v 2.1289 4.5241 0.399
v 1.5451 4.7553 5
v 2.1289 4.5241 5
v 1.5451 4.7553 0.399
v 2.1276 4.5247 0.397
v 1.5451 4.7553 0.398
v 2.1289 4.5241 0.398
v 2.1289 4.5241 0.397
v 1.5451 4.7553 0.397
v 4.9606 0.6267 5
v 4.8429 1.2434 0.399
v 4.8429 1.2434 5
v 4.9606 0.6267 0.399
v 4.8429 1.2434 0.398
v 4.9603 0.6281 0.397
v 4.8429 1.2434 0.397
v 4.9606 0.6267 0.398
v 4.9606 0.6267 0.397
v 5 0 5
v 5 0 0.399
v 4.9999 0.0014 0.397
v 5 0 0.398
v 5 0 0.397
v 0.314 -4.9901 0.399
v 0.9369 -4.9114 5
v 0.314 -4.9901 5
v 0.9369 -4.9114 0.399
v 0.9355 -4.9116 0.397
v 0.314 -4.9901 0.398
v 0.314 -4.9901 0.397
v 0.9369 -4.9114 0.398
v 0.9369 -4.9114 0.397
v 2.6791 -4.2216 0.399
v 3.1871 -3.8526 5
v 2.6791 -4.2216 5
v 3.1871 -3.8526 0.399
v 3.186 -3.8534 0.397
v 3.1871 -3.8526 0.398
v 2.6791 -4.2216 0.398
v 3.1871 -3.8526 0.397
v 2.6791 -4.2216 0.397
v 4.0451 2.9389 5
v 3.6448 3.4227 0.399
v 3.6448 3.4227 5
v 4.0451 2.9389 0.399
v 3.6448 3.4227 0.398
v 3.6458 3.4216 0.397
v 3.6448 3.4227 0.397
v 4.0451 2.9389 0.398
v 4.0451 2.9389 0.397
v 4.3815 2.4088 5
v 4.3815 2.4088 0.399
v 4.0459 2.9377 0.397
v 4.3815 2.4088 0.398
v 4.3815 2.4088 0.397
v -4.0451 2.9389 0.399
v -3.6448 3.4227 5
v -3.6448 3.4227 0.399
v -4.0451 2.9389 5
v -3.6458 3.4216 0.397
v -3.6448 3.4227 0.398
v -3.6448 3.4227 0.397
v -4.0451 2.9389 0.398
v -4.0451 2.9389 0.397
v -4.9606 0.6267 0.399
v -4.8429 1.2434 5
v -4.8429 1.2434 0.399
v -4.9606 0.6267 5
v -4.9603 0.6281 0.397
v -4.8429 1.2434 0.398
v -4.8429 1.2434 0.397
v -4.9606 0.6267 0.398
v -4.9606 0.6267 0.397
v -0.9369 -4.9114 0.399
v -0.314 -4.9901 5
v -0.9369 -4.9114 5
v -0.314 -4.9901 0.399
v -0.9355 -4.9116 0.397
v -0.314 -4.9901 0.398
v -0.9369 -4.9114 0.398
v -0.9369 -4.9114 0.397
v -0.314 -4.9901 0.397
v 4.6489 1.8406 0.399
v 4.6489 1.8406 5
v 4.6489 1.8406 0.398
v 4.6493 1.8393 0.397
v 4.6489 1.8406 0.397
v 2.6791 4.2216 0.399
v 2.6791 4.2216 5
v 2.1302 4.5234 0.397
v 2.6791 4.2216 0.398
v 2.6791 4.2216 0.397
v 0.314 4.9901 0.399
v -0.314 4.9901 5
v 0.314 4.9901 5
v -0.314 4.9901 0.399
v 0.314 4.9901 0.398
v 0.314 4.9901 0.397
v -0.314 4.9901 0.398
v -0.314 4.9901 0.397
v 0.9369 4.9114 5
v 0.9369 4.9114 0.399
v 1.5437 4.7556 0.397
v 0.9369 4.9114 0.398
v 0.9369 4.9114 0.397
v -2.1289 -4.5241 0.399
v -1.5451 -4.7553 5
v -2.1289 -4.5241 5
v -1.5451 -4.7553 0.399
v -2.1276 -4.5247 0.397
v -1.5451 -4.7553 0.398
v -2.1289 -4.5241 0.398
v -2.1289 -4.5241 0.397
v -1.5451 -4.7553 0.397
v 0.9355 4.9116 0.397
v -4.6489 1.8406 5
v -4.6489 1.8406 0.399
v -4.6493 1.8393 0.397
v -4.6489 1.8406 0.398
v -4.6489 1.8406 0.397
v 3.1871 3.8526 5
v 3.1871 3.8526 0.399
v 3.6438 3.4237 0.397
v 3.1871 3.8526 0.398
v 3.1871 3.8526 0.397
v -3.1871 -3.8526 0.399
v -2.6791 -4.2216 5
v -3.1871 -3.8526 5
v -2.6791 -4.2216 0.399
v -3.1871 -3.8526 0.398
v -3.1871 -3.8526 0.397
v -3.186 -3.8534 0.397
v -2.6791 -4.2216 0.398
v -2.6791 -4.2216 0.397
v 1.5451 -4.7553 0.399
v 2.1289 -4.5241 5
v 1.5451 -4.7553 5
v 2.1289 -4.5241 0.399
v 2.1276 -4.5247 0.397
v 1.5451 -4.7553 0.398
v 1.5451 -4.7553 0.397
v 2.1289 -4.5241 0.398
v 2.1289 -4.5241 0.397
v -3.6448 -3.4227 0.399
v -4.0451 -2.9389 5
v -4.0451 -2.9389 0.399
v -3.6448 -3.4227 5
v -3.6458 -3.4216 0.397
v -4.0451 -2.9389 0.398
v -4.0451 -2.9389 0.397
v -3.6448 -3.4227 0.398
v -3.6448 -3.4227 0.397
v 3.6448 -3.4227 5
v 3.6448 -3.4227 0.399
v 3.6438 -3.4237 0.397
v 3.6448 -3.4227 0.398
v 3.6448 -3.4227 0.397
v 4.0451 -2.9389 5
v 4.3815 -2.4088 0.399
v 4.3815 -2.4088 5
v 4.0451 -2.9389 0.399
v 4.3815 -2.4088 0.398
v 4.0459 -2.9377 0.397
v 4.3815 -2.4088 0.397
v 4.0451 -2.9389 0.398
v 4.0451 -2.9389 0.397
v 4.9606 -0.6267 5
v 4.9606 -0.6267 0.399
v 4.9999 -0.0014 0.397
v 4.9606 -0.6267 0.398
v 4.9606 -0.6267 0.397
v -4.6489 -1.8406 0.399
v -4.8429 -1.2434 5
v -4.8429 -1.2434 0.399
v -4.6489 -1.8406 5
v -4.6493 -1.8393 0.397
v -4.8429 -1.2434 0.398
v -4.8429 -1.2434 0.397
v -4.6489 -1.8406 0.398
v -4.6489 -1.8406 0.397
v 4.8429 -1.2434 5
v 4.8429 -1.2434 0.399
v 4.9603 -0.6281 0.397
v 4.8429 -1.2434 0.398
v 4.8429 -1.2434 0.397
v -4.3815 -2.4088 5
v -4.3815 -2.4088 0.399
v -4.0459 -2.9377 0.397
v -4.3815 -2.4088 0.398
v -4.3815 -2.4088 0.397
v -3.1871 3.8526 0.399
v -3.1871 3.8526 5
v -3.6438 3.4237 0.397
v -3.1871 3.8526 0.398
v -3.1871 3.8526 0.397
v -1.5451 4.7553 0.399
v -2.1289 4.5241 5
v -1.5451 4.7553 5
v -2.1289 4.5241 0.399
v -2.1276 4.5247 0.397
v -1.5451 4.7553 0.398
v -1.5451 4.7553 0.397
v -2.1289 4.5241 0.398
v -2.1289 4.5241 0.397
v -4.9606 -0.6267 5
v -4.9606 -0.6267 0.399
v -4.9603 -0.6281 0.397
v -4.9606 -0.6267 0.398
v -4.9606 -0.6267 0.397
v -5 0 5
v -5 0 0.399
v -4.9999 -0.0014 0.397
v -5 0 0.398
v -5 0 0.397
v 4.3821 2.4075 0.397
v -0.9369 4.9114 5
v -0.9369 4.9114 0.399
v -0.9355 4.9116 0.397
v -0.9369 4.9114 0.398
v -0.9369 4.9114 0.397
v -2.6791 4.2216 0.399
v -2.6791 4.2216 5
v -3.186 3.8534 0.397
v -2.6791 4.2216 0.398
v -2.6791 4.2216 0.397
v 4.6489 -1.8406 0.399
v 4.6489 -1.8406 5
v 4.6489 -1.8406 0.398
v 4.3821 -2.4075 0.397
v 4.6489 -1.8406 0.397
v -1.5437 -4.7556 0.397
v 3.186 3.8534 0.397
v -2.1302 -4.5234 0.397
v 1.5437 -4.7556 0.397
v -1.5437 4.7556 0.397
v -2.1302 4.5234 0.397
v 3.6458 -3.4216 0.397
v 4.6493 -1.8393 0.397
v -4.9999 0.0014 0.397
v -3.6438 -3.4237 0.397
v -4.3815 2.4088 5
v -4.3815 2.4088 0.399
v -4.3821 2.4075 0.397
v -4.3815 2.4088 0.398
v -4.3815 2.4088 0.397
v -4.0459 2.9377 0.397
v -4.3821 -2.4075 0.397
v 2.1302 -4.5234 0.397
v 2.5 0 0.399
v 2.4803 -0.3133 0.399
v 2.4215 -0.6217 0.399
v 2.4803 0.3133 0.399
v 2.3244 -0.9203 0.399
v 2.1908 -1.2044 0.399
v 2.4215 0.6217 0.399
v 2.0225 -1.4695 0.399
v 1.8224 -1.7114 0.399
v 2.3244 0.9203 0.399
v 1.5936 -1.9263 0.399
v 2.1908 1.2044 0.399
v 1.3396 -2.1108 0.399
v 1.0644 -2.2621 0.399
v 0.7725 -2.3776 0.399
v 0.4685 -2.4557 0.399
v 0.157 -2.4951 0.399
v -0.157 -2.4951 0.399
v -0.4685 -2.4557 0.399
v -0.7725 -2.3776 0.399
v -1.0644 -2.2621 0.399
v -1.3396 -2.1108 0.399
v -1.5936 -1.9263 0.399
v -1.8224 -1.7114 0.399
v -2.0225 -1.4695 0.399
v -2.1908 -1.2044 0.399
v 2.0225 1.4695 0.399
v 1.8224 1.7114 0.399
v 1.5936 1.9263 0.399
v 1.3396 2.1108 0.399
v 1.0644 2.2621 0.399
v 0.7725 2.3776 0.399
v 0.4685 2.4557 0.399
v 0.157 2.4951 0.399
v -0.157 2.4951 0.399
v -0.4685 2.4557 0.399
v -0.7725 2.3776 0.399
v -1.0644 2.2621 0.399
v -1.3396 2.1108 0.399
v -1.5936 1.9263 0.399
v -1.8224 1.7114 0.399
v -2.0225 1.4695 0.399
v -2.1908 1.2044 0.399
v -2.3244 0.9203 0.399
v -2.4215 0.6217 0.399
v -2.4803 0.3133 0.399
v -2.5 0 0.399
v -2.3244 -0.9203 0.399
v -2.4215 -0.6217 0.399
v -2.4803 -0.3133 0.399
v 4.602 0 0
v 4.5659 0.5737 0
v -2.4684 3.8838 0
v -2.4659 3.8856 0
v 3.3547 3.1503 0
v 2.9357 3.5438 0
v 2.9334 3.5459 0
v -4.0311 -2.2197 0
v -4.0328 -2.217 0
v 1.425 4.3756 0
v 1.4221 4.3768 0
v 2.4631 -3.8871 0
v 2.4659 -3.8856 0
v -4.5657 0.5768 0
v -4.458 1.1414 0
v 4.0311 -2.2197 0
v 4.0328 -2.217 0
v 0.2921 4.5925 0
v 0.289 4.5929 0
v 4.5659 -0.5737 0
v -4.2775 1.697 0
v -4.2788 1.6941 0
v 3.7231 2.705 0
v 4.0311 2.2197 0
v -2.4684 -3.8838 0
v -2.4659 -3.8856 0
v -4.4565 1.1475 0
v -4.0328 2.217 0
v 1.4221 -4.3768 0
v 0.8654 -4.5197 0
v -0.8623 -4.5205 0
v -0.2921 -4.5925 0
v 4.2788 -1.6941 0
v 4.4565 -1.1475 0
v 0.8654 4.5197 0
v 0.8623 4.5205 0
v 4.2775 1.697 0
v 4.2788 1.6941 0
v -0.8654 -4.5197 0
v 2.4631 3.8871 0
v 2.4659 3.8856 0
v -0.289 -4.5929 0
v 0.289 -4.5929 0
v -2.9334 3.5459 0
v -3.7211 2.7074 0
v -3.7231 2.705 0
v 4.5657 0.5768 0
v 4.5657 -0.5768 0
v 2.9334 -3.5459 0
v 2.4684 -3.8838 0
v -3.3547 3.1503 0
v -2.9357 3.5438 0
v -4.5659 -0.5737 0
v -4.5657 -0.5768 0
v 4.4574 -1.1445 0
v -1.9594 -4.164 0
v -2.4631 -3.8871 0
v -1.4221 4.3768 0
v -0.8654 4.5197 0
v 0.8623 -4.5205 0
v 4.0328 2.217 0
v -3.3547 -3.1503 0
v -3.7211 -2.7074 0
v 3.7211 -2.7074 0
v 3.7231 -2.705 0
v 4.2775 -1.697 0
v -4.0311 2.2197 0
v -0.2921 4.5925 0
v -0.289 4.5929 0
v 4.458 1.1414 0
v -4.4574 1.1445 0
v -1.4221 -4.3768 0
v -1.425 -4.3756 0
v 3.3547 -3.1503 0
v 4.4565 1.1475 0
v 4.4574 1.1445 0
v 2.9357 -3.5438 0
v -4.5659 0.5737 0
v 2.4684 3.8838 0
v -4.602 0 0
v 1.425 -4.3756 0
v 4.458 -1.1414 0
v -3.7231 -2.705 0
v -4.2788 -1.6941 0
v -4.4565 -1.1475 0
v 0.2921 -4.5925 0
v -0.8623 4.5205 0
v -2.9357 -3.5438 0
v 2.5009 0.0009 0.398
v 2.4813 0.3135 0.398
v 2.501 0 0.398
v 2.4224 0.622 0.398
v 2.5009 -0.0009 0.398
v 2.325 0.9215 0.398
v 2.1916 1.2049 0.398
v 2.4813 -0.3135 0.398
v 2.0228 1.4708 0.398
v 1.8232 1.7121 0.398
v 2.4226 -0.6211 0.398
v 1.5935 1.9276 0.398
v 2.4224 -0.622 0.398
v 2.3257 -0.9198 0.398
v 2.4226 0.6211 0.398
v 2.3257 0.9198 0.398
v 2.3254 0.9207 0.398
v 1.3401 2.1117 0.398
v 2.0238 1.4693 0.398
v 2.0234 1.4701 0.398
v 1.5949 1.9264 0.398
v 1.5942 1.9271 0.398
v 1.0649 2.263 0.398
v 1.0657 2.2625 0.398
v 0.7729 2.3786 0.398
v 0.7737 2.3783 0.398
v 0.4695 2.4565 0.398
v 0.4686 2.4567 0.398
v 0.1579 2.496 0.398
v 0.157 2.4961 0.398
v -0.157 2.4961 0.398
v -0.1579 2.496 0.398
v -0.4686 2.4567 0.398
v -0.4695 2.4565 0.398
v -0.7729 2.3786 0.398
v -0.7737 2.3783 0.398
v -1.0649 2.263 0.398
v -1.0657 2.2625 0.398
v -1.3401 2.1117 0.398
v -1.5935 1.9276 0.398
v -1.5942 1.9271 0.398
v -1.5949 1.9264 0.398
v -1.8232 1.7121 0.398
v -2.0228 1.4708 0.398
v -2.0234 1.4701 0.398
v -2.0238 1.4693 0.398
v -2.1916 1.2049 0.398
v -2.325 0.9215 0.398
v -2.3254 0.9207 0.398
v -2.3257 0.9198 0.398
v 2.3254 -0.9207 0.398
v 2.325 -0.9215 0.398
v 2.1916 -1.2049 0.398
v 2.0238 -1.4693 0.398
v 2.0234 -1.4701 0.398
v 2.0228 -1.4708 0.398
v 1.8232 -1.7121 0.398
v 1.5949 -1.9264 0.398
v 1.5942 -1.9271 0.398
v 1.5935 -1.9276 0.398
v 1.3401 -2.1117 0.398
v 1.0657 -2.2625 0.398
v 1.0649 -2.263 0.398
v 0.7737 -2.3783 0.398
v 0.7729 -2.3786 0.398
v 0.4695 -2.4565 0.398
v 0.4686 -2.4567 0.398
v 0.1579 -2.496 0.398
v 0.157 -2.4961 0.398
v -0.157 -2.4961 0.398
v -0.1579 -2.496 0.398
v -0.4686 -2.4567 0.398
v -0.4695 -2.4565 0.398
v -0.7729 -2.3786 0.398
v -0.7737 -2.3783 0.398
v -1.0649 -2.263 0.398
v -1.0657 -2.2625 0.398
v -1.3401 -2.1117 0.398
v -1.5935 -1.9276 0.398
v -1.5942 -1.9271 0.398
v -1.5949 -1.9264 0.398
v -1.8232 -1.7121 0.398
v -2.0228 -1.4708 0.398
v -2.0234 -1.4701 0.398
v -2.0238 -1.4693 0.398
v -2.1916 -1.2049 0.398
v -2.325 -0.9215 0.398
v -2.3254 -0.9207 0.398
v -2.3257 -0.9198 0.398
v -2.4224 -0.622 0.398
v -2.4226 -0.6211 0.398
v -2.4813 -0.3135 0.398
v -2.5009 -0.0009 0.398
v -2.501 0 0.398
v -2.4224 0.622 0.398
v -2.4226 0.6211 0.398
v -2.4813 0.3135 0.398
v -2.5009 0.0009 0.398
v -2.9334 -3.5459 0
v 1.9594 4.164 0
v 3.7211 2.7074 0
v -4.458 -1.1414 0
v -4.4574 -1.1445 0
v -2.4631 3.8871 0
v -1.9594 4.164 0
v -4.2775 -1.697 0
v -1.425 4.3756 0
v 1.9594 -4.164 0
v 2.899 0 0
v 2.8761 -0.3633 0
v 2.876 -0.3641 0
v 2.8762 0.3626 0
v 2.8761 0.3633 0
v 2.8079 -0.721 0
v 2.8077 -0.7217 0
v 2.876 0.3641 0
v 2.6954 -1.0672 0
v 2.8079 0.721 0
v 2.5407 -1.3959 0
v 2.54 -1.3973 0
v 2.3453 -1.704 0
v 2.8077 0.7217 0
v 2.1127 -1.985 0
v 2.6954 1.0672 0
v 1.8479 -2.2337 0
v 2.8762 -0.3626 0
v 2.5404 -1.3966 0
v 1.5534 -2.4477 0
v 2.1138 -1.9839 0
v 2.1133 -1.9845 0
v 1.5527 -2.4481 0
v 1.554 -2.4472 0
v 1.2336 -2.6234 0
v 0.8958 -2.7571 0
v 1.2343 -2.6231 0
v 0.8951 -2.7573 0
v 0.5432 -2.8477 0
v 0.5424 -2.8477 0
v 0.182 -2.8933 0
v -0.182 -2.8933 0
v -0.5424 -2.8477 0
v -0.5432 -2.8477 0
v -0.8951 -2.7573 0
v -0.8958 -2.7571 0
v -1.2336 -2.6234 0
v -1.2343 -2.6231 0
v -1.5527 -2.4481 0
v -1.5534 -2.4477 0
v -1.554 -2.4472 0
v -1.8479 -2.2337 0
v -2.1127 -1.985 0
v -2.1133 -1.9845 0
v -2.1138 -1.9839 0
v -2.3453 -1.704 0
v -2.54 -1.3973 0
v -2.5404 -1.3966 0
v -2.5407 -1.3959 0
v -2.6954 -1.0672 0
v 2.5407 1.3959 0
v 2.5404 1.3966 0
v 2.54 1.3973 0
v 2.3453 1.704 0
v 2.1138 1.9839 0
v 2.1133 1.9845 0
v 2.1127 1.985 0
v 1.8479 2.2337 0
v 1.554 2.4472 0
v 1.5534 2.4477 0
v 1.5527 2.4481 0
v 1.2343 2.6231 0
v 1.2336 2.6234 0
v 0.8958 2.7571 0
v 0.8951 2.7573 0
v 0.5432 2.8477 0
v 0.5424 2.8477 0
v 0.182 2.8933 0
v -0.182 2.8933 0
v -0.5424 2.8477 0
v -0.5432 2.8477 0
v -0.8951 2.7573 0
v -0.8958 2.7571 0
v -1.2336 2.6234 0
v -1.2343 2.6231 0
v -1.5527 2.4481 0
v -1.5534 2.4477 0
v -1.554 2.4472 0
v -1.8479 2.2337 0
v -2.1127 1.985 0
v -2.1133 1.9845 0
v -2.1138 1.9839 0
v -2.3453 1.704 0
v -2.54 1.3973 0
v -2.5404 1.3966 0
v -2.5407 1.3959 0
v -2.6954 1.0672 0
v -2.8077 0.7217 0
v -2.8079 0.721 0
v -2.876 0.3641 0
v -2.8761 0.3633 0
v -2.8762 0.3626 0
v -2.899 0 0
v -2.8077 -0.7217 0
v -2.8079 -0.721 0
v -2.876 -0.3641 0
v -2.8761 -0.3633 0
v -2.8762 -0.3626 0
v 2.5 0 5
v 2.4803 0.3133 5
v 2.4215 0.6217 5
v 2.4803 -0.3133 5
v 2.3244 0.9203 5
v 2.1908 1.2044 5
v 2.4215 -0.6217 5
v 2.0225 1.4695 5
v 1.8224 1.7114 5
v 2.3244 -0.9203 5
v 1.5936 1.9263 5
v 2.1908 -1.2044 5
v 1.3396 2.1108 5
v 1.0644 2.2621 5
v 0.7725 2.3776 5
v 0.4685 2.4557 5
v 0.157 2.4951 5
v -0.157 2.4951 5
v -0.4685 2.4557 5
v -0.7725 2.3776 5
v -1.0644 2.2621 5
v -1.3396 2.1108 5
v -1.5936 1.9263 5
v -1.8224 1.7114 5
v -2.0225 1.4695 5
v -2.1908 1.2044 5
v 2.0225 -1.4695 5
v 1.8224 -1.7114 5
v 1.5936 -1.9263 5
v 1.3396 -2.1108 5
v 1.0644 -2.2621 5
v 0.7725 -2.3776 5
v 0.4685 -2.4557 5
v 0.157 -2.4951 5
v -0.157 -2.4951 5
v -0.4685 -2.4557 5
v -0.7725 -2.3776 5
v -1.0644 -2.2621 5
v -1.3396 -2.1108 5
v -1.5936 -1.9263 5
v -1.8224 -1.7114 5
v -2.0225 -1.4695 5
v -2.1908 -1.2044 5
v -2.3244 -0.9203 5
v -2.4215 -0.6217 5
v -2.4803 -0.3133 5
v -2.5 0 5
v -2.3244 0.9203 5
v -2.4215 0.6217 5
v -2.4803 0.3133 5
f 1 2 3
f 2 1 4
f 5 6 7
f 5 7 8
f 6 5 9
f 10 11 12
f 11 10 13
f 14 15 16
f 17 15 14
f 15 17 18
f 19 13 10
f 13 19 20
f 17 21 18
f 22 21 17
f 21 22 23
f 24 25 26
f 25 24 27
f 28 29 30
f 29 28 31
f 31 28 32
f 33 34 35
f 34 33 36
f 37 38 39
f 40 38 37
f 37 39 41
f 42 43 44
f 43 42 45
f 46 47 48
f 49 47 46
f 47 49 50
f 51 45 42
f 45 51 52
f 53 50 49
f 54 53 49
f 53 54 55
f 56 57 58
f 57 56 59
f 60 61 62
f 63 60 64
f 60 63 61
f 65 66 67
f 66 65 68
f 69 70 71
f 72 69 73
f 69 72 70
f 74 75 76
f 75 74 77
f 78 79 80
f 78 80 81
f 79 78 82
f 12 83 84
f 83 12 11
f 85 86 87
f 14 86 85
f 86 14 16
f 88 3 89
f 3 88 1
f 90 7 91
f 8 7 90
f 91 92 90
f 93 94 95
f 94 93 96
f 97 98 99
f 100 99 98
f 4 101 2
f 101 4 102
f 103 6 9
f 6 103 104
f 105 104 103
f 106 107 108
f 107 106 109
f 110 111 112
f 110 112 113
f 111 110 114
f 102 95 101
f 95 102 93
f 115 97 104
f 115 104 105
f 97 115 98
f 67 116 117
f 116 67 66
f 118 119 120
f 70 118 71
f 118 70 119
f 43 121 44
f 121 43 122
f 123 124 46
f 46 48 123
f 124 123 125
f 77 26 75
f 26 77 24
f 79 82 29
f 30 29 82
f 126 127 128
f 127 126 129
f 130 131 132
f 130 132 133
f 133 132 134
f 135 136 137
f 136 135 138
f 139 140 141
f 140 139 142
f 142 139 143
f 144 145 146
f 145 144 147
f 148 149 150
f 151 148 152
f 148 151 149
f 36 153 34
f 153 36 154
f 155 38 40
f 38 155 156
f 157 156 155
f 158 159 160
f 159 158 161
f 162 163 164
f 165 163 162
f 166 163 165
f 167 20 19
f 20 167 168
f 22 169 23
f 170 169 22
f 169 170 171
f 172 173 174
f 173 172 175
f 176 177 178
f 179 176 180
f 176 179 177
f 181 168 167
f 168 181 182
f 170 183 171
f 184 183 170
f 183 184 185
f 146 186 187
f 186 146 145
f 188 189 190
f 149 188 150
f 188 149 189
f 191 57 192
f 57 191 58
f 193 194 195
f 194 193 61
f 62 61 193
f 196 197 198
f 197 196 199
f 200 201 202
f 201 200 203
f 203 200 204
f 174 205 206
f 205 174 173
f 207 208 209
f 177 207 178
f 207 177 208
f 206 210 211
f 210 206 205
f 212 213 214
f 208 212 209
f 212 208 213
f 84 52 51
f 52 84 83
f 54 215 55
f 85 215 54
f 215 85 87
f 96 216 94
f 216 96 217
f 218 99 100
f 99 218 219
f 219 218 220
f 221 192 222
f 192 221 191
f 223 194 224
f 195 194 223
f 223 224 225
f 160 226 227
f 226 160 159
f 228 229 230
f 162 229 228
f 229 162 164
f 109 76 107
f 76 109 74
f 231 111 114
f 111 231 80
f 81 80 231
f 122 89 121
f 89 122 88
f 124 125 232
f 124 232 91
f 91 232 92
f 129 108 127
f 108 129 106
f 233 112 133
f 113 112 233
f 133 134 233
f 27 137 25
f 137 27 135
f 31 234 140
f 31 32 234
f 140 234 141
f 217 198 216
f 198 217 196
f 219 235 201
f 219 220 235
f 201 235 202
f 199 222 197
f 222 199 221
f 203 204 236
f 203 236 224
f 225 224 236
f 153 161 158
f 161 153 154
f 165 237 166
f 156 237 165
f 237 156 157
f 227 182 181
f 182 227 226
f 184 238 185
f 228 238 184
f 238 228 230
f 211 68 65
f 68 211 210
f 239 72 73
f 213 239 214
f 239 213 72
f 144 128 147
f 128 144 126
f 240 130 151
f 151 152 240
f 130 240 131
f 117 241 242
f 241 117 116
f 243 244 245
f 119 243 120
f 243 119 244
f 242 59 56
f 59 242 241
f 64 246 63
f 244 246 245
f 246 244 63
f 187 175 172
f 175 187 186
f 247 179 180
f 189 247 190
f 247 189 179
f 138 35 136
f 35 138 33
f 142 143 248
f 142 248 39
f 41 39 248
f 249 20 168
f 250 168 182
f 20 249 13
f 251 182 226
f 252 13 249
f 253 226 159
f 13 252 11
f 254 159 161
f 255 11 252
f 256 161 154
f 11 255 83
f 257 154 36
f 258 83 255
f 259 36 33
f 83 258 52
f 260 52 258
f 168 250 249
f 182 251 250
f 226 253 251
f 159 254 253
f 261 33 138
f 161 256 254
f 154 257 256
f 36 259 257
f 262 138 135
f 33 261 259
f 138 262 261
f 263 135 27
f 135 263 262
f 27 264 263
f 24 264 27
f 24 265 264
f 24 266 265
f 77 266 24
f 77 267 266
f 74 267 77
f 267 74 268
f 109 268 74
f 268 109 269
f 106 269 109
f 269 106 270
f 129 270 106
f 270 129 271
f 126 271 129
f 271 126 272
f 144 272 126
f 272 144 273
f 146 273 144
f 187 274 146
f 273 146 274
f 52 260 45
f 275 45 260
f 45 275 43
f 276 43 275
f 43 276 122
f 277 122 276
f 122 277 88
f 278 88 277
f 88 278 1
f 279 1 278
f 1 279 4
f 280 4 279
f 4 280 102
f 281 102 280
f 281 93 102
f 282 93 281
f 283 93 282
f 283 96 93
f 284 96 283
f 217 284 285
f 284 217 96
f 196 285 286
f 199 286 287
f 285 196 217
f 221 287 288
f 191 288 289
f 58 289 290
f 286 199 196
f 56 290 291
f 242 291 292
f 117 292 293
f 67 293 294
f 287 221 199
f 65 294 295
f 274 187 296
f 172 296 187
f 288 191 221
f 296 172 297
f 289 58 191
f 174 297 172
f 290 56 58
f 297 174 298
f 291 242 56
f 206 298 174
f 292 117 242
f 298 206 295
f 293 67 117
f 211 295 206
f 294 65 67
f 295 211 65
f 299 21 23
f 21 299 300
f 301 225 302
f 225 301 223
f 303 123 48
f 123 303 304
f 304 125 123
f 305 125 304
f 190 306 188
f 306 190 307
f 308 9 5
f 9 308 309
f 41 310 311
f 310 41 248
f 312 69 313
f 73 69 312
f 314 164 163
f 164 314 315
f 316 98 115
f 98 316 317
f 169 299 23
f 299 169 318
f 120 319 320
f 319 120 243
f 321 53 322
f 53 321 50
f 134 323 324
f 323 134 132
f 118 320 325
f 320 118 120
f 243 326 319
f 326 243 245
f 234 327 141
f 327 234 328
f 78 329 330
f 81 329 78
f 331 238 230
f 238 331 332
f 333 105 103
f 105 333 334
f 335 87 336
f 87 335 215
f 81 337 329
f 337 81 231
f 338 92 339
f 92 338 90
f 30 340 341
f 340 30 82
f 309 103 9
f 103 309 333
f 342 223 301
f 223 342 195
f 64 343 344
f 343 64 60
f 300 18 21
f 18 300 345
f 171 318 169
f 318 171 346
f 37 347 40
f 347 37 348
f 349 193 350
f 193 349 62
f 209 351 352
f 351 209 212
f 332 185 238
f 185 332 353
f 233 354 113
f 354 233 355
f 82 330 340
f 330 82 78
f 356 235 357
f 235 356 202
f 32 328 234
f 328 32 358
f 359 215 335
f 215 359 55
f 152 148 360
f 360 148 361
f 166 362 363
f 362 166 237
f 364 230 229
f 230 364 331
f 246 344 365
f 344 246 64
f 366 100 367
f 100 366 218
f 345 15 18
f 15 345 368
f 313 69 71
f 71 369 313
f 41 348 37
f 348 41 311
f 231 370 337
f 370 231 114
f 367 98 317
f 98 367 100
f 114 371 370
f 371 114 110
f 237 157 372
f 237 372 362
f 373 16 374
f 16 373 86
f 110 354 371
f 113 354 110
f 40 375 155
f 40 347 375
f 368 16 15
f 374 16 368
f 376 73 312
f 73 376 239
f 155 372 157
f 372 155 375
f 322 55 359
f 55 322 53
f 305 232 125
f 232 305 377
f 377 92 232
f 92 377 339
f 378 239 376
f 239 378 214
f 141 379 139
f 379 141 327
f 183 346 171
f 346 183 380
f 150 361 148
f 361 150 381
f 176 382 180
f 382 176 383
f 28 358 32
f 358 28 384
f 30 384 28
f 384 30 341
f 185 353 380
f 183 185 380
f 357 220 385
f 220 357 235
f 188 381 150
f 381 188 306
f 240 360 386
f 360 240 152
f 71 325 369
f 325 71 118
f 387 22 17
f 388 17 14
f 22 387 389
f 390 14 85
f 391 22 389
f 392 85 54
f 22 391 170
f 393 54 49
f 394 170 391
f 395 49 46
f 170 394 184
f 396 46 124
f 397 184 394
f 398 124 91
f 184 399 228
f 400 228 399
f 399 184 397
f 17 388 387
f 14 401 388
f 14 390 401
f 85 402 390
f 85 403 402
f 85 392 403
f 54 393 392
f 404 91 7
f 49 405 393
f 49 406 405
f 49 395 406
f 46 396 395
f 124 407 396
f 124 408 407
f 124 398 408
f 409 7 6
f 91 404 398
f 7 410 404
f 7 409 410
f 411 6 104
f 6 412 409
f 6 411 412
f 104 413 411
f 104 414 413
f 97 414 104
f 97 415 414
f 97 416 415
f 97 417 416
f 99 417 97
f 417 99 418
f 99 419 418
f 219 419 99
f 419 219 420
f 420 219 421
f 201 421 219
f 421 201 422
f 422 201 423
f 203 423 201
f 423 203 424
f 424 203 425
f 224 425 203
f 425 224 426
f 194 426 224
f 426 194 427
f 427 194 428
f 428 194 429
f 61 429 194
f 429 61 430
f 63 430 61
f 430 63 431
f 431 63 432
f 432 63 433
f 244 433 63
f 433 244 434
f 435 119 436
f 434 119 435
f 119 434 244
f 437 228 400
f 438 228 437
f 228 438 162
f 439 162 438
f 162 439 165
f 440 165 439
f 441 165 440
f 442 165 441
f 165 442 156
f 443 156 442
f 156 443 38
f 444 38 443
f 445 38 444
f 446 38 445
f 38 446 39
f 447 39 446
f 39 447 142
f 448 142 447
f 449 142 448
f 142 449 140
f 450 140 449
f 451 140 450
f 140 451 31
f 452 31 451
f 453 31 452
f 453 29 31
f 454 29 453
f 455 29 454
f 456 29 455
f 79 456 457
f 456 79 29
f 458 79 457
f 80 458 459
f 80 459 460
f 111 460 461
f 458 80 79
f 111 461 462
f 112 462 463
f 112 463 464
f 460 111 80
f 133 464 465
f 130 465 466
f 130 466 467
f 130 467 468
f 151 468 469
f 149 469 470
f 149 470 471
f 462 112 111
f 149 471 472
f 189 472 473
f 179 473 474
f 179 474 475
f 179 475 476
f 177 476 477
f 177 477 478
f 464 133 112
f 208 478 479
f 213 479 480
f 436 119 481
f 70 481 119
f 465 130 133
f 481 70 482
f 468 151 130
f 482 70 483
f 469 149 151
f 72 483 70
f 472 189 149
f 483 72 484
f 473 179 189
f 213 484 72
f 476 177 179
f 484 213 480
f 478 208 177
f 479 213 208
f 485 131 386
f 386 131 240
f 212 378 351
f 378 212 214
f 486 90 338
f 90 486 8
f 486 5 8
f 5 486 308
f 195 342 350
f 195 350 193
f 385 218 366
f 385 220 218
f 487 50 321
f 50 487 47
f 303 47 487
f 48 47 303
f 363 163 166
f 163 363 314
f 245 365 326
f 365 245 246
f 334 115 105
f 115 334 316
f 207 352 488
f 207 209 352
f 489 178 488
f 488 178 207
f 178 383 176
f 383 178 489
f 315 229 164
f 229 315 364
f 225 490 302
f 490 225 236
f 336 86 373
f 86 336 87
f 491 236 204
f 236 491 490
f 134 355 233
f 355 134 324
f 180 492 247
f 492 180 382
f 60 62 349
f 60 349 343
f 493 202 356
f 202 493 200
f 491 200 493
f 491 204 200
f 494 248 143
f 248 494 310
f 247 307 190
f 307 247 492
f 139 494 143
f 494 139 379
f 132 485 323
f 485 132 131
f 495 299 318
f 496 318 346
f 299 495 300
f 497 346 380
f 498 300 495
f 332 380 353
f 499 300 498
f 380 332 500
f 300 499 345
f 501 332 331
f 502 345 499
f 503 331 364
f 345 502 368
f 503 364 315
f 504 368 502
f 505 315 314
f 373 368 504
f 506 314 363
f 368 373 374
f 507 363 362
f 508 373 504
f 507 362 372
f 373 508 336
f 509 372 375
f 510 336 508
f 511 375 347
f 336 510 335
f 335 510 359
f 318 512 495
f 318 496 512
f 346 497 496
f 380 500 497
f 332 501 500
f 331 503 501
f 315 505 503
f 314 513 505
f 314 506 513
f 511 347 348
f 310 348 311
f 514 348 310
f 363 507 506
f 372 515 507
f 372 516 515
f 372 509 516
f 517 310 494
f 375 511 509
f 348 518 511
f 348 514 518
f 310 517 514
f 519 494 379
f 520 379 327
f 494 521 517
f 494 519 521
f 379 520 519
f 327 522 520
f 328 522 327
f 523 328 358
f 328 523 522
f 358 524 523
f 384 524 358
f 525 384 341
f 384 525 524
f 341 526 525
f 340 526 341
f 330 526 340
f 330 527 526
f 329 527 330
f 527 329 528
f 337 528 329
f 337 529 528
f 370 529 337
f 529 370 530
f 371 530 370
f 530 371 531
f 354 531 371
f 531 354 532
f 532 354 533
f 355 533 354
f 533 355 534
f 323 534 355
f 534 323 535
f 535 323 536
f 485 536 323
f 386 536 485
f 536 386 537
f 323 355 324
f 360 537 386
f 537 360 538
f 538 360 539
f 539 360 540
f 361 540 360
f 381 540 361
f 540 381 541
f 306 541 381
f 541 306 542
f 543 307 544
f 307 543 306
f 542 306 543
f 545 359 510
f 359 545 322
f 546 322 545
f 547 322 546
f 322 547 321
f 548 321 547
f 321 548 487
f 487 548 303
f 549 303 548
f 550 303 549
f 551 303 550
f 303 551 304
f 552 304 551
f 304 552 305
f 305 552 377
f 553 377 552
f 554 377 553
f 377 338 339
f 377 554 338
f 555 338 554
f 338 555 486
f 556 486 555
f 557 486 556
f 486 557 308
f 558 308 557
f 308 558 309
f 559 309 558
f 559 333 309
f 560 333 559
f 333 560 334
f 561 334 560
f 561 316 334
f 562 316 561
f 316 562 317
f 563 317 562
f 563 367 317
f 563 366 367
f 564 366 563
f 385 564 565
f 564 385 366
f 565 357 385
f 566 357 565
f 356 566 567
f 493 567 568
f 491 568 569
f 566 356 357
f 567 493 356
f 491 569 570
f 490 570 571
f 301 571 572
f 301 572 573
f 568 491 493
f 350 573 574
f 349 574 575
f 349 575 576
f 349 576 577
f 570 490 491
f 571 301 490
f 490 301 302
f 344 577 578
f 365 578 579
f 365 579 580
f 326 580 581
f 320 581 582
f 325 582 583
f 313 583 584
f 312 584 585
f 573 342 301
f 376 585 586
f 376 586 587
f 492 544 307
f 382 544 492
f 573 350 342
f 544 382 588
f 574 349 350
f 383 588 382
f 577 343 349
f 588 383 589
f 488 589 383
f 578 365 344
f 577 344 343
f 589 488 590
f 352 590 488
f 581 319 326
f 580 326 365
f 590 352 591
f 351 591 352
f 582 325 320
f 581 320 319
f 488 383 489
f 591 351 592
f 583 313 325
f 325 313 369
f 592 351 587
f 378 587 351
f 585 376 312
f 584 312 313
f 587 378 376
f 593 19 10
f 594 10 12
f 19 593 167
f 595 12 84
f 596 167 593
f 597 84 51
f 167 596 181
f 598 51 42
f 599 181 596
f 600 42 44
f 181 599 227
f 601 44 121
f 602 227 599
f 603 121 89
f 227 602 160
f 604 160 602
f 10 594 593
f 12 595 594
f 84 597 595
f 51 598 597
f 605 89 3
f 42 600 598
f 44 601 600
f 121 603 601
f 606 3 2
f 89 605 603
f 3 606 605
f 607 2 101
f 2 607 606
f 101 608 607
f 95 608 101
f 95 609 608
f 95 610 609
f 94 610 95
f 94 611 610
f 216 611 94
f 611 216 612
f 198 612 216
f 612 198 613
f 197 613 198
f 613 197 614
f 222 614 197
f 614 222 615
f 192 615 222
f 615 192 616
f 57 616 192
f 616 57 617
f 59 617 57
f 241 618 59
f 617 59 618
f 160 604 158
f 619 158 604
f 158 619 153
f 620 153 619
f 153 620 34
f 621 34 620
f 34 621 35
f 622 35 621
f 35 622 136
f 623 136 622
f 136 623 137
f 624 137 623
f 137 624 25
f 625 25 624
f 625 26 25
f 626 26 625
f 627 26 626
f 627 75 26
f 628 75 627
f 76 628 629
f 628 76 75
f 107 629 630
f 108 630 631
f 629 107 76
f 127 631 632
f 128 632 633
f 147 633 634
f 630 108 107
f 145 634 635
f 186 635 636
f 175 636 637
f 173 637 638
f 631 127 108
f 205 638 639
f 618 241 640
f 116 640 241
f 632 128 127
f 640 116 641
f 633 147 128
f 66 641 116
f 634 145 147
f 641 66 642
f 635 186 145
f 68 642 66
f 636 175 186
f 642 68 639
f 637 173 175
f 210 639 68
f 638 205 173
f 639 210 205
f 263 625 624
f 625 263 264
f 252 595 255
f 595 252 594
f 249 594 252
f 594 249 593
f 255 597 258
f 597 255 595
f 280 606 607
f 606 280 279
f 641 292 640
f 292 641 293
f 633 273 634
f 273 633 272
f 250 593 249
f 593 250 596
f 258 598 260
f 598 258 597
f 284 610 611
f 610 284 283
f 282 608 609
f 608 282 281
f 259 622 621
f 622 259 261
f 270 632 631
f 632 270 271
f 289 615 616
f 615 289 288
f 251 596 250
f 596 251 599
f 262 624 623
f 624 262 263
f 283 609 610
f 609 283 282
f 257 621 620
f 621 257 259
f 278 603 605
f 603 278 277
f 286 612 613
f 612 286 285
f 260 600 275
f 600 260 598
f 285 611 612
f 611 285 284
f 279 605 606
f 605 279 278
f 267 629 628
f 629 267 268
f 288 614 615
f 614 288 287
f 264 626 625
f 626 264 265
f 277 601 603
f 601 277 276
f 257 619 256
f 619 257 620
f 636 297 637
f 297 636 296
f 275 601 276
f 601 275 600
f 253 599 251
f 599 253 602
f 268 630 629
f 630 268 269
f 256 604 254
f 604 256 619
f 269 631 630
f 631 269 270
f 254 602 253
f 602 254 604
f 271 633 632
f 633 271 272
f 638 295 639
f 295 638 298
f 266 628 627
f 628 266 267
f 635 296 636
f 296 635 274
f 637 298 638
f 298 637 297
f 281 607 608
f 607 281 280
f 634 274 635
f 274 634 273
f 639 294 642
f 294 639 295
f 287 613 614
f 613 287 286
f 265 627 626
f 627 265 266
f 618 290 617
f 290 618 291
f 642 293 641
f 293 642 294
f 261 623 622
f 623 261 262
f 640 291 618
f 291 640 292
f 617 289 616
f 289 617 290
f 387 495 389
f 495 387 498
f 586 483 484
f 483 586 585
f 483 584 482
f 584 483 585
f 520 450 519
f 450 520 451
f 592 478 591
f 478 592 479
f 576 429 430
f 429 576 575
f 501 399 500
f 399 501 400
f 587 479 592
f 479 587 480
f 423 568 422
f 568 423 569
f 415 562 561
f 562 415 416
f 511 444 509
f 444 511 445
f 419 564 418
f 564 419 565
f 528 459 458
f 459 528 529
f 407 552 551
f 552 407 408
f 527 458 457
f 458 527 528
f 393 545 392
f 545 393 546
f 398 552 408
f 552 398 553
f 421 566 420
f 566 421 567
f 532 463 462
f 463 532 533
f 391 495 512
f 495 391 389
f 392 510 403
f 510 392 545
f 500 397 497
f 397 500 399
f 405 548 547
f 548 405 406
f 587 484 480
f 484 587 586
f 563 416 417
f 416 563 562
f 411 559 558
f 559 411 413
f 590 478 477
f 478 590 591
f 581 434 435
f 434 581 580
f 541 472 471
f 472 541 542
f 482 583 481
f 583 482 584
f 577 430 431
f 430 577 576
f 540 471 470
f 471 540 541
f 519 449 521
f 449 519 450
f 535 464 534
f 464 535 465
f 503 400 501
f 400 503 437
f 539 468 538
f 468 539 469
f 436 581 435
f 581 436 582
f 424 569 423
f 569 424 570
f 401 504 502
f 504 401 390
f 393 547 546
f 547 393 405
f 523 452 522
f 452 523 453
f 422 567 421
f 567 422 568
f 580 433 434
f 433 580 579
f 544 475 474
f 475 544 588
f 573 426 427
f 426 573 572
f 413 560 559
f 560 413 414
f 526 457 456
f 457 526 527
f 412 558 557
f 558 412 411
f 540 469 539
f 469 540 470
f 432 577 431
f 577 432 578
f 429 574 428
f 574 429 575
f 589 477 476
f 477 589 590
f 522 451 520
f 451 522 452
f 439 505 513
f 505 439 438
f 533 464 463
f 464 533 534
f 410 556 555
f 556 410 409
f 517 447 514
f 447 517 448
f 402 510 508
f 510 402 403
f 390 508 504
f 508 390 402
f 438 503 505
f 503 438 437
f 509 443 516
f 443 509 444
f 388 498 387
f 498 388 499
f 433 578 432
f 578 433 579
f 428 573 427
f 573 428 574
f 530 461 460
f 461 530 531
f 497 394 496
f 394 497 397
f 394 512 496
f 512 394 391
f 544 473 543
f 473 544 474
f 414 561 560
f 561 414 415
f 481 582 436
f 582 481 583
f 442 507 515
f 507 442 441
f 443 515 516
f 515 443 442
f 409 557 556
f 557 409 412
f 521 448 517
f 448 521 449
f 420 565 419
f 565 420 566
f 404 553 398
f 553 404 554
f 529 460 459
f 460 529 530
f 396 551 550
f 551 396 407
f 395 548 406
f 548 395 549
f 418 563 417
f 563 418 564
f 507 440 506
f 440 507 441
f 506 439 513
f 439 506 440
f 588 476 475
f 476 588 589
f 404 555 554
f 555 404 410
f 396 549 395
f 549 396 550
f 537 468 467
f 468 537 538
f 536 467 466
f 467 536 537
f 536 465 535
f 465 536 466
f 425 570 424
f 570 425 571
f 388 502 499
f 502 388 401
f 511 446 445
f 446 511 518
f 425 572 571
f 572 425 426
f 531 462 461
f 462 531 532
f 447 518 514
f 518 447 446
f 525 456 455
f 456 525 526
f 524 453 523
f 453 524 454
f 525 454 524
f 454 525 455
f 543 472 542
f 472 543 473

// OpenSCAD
// [FL_INDEX: keywords="openscad, 3d_parametric, Parametric_Washer_Spacer, csg_solid" | COT="Parametric OpenSCAD design from 3DCodeverse"]
// Title: Parametric Washer/Spacer


// height in mm
height = 5;

// inner diameter in mm
inner_diameter = 5;

// outer diameter in mm
outer_diameter = 10;

// inner chamfer at bottom in mm (to avoid 'elephant foot' when 3d printing)
chamfer_inner = 0.4;

// outer chamfer at bottom in mm (to avoid 'elephant foot' when 3d printing)
chamfer_outer = 0.4;

/* [Hidden] */

inner_radius = inner_diameter/2;
outer_radius = outer_diameter/2;
eps = 0.001;

$fn = 50;

difference() 
{
	cylinder(h=height, r=outer_radius);
	translate([0,0,-eps]) cylinder(h=height+1, r=inner_radius);

	translate([0,0,-eps]) cylinder(h=chamfer_inner, r1=inner_radius+chamfer_inner, r2=inner_radius);
    
    translate([0,0,-eps]) difference()
    {
        cylinder(h=chamfer_outer, r=outer_radius);
        translate([0,0,-eps]) cylinder(h=chamfer_outer, r1=outer_radius-chamfer_outer, r2=outer_radius+eps);
    }
}
